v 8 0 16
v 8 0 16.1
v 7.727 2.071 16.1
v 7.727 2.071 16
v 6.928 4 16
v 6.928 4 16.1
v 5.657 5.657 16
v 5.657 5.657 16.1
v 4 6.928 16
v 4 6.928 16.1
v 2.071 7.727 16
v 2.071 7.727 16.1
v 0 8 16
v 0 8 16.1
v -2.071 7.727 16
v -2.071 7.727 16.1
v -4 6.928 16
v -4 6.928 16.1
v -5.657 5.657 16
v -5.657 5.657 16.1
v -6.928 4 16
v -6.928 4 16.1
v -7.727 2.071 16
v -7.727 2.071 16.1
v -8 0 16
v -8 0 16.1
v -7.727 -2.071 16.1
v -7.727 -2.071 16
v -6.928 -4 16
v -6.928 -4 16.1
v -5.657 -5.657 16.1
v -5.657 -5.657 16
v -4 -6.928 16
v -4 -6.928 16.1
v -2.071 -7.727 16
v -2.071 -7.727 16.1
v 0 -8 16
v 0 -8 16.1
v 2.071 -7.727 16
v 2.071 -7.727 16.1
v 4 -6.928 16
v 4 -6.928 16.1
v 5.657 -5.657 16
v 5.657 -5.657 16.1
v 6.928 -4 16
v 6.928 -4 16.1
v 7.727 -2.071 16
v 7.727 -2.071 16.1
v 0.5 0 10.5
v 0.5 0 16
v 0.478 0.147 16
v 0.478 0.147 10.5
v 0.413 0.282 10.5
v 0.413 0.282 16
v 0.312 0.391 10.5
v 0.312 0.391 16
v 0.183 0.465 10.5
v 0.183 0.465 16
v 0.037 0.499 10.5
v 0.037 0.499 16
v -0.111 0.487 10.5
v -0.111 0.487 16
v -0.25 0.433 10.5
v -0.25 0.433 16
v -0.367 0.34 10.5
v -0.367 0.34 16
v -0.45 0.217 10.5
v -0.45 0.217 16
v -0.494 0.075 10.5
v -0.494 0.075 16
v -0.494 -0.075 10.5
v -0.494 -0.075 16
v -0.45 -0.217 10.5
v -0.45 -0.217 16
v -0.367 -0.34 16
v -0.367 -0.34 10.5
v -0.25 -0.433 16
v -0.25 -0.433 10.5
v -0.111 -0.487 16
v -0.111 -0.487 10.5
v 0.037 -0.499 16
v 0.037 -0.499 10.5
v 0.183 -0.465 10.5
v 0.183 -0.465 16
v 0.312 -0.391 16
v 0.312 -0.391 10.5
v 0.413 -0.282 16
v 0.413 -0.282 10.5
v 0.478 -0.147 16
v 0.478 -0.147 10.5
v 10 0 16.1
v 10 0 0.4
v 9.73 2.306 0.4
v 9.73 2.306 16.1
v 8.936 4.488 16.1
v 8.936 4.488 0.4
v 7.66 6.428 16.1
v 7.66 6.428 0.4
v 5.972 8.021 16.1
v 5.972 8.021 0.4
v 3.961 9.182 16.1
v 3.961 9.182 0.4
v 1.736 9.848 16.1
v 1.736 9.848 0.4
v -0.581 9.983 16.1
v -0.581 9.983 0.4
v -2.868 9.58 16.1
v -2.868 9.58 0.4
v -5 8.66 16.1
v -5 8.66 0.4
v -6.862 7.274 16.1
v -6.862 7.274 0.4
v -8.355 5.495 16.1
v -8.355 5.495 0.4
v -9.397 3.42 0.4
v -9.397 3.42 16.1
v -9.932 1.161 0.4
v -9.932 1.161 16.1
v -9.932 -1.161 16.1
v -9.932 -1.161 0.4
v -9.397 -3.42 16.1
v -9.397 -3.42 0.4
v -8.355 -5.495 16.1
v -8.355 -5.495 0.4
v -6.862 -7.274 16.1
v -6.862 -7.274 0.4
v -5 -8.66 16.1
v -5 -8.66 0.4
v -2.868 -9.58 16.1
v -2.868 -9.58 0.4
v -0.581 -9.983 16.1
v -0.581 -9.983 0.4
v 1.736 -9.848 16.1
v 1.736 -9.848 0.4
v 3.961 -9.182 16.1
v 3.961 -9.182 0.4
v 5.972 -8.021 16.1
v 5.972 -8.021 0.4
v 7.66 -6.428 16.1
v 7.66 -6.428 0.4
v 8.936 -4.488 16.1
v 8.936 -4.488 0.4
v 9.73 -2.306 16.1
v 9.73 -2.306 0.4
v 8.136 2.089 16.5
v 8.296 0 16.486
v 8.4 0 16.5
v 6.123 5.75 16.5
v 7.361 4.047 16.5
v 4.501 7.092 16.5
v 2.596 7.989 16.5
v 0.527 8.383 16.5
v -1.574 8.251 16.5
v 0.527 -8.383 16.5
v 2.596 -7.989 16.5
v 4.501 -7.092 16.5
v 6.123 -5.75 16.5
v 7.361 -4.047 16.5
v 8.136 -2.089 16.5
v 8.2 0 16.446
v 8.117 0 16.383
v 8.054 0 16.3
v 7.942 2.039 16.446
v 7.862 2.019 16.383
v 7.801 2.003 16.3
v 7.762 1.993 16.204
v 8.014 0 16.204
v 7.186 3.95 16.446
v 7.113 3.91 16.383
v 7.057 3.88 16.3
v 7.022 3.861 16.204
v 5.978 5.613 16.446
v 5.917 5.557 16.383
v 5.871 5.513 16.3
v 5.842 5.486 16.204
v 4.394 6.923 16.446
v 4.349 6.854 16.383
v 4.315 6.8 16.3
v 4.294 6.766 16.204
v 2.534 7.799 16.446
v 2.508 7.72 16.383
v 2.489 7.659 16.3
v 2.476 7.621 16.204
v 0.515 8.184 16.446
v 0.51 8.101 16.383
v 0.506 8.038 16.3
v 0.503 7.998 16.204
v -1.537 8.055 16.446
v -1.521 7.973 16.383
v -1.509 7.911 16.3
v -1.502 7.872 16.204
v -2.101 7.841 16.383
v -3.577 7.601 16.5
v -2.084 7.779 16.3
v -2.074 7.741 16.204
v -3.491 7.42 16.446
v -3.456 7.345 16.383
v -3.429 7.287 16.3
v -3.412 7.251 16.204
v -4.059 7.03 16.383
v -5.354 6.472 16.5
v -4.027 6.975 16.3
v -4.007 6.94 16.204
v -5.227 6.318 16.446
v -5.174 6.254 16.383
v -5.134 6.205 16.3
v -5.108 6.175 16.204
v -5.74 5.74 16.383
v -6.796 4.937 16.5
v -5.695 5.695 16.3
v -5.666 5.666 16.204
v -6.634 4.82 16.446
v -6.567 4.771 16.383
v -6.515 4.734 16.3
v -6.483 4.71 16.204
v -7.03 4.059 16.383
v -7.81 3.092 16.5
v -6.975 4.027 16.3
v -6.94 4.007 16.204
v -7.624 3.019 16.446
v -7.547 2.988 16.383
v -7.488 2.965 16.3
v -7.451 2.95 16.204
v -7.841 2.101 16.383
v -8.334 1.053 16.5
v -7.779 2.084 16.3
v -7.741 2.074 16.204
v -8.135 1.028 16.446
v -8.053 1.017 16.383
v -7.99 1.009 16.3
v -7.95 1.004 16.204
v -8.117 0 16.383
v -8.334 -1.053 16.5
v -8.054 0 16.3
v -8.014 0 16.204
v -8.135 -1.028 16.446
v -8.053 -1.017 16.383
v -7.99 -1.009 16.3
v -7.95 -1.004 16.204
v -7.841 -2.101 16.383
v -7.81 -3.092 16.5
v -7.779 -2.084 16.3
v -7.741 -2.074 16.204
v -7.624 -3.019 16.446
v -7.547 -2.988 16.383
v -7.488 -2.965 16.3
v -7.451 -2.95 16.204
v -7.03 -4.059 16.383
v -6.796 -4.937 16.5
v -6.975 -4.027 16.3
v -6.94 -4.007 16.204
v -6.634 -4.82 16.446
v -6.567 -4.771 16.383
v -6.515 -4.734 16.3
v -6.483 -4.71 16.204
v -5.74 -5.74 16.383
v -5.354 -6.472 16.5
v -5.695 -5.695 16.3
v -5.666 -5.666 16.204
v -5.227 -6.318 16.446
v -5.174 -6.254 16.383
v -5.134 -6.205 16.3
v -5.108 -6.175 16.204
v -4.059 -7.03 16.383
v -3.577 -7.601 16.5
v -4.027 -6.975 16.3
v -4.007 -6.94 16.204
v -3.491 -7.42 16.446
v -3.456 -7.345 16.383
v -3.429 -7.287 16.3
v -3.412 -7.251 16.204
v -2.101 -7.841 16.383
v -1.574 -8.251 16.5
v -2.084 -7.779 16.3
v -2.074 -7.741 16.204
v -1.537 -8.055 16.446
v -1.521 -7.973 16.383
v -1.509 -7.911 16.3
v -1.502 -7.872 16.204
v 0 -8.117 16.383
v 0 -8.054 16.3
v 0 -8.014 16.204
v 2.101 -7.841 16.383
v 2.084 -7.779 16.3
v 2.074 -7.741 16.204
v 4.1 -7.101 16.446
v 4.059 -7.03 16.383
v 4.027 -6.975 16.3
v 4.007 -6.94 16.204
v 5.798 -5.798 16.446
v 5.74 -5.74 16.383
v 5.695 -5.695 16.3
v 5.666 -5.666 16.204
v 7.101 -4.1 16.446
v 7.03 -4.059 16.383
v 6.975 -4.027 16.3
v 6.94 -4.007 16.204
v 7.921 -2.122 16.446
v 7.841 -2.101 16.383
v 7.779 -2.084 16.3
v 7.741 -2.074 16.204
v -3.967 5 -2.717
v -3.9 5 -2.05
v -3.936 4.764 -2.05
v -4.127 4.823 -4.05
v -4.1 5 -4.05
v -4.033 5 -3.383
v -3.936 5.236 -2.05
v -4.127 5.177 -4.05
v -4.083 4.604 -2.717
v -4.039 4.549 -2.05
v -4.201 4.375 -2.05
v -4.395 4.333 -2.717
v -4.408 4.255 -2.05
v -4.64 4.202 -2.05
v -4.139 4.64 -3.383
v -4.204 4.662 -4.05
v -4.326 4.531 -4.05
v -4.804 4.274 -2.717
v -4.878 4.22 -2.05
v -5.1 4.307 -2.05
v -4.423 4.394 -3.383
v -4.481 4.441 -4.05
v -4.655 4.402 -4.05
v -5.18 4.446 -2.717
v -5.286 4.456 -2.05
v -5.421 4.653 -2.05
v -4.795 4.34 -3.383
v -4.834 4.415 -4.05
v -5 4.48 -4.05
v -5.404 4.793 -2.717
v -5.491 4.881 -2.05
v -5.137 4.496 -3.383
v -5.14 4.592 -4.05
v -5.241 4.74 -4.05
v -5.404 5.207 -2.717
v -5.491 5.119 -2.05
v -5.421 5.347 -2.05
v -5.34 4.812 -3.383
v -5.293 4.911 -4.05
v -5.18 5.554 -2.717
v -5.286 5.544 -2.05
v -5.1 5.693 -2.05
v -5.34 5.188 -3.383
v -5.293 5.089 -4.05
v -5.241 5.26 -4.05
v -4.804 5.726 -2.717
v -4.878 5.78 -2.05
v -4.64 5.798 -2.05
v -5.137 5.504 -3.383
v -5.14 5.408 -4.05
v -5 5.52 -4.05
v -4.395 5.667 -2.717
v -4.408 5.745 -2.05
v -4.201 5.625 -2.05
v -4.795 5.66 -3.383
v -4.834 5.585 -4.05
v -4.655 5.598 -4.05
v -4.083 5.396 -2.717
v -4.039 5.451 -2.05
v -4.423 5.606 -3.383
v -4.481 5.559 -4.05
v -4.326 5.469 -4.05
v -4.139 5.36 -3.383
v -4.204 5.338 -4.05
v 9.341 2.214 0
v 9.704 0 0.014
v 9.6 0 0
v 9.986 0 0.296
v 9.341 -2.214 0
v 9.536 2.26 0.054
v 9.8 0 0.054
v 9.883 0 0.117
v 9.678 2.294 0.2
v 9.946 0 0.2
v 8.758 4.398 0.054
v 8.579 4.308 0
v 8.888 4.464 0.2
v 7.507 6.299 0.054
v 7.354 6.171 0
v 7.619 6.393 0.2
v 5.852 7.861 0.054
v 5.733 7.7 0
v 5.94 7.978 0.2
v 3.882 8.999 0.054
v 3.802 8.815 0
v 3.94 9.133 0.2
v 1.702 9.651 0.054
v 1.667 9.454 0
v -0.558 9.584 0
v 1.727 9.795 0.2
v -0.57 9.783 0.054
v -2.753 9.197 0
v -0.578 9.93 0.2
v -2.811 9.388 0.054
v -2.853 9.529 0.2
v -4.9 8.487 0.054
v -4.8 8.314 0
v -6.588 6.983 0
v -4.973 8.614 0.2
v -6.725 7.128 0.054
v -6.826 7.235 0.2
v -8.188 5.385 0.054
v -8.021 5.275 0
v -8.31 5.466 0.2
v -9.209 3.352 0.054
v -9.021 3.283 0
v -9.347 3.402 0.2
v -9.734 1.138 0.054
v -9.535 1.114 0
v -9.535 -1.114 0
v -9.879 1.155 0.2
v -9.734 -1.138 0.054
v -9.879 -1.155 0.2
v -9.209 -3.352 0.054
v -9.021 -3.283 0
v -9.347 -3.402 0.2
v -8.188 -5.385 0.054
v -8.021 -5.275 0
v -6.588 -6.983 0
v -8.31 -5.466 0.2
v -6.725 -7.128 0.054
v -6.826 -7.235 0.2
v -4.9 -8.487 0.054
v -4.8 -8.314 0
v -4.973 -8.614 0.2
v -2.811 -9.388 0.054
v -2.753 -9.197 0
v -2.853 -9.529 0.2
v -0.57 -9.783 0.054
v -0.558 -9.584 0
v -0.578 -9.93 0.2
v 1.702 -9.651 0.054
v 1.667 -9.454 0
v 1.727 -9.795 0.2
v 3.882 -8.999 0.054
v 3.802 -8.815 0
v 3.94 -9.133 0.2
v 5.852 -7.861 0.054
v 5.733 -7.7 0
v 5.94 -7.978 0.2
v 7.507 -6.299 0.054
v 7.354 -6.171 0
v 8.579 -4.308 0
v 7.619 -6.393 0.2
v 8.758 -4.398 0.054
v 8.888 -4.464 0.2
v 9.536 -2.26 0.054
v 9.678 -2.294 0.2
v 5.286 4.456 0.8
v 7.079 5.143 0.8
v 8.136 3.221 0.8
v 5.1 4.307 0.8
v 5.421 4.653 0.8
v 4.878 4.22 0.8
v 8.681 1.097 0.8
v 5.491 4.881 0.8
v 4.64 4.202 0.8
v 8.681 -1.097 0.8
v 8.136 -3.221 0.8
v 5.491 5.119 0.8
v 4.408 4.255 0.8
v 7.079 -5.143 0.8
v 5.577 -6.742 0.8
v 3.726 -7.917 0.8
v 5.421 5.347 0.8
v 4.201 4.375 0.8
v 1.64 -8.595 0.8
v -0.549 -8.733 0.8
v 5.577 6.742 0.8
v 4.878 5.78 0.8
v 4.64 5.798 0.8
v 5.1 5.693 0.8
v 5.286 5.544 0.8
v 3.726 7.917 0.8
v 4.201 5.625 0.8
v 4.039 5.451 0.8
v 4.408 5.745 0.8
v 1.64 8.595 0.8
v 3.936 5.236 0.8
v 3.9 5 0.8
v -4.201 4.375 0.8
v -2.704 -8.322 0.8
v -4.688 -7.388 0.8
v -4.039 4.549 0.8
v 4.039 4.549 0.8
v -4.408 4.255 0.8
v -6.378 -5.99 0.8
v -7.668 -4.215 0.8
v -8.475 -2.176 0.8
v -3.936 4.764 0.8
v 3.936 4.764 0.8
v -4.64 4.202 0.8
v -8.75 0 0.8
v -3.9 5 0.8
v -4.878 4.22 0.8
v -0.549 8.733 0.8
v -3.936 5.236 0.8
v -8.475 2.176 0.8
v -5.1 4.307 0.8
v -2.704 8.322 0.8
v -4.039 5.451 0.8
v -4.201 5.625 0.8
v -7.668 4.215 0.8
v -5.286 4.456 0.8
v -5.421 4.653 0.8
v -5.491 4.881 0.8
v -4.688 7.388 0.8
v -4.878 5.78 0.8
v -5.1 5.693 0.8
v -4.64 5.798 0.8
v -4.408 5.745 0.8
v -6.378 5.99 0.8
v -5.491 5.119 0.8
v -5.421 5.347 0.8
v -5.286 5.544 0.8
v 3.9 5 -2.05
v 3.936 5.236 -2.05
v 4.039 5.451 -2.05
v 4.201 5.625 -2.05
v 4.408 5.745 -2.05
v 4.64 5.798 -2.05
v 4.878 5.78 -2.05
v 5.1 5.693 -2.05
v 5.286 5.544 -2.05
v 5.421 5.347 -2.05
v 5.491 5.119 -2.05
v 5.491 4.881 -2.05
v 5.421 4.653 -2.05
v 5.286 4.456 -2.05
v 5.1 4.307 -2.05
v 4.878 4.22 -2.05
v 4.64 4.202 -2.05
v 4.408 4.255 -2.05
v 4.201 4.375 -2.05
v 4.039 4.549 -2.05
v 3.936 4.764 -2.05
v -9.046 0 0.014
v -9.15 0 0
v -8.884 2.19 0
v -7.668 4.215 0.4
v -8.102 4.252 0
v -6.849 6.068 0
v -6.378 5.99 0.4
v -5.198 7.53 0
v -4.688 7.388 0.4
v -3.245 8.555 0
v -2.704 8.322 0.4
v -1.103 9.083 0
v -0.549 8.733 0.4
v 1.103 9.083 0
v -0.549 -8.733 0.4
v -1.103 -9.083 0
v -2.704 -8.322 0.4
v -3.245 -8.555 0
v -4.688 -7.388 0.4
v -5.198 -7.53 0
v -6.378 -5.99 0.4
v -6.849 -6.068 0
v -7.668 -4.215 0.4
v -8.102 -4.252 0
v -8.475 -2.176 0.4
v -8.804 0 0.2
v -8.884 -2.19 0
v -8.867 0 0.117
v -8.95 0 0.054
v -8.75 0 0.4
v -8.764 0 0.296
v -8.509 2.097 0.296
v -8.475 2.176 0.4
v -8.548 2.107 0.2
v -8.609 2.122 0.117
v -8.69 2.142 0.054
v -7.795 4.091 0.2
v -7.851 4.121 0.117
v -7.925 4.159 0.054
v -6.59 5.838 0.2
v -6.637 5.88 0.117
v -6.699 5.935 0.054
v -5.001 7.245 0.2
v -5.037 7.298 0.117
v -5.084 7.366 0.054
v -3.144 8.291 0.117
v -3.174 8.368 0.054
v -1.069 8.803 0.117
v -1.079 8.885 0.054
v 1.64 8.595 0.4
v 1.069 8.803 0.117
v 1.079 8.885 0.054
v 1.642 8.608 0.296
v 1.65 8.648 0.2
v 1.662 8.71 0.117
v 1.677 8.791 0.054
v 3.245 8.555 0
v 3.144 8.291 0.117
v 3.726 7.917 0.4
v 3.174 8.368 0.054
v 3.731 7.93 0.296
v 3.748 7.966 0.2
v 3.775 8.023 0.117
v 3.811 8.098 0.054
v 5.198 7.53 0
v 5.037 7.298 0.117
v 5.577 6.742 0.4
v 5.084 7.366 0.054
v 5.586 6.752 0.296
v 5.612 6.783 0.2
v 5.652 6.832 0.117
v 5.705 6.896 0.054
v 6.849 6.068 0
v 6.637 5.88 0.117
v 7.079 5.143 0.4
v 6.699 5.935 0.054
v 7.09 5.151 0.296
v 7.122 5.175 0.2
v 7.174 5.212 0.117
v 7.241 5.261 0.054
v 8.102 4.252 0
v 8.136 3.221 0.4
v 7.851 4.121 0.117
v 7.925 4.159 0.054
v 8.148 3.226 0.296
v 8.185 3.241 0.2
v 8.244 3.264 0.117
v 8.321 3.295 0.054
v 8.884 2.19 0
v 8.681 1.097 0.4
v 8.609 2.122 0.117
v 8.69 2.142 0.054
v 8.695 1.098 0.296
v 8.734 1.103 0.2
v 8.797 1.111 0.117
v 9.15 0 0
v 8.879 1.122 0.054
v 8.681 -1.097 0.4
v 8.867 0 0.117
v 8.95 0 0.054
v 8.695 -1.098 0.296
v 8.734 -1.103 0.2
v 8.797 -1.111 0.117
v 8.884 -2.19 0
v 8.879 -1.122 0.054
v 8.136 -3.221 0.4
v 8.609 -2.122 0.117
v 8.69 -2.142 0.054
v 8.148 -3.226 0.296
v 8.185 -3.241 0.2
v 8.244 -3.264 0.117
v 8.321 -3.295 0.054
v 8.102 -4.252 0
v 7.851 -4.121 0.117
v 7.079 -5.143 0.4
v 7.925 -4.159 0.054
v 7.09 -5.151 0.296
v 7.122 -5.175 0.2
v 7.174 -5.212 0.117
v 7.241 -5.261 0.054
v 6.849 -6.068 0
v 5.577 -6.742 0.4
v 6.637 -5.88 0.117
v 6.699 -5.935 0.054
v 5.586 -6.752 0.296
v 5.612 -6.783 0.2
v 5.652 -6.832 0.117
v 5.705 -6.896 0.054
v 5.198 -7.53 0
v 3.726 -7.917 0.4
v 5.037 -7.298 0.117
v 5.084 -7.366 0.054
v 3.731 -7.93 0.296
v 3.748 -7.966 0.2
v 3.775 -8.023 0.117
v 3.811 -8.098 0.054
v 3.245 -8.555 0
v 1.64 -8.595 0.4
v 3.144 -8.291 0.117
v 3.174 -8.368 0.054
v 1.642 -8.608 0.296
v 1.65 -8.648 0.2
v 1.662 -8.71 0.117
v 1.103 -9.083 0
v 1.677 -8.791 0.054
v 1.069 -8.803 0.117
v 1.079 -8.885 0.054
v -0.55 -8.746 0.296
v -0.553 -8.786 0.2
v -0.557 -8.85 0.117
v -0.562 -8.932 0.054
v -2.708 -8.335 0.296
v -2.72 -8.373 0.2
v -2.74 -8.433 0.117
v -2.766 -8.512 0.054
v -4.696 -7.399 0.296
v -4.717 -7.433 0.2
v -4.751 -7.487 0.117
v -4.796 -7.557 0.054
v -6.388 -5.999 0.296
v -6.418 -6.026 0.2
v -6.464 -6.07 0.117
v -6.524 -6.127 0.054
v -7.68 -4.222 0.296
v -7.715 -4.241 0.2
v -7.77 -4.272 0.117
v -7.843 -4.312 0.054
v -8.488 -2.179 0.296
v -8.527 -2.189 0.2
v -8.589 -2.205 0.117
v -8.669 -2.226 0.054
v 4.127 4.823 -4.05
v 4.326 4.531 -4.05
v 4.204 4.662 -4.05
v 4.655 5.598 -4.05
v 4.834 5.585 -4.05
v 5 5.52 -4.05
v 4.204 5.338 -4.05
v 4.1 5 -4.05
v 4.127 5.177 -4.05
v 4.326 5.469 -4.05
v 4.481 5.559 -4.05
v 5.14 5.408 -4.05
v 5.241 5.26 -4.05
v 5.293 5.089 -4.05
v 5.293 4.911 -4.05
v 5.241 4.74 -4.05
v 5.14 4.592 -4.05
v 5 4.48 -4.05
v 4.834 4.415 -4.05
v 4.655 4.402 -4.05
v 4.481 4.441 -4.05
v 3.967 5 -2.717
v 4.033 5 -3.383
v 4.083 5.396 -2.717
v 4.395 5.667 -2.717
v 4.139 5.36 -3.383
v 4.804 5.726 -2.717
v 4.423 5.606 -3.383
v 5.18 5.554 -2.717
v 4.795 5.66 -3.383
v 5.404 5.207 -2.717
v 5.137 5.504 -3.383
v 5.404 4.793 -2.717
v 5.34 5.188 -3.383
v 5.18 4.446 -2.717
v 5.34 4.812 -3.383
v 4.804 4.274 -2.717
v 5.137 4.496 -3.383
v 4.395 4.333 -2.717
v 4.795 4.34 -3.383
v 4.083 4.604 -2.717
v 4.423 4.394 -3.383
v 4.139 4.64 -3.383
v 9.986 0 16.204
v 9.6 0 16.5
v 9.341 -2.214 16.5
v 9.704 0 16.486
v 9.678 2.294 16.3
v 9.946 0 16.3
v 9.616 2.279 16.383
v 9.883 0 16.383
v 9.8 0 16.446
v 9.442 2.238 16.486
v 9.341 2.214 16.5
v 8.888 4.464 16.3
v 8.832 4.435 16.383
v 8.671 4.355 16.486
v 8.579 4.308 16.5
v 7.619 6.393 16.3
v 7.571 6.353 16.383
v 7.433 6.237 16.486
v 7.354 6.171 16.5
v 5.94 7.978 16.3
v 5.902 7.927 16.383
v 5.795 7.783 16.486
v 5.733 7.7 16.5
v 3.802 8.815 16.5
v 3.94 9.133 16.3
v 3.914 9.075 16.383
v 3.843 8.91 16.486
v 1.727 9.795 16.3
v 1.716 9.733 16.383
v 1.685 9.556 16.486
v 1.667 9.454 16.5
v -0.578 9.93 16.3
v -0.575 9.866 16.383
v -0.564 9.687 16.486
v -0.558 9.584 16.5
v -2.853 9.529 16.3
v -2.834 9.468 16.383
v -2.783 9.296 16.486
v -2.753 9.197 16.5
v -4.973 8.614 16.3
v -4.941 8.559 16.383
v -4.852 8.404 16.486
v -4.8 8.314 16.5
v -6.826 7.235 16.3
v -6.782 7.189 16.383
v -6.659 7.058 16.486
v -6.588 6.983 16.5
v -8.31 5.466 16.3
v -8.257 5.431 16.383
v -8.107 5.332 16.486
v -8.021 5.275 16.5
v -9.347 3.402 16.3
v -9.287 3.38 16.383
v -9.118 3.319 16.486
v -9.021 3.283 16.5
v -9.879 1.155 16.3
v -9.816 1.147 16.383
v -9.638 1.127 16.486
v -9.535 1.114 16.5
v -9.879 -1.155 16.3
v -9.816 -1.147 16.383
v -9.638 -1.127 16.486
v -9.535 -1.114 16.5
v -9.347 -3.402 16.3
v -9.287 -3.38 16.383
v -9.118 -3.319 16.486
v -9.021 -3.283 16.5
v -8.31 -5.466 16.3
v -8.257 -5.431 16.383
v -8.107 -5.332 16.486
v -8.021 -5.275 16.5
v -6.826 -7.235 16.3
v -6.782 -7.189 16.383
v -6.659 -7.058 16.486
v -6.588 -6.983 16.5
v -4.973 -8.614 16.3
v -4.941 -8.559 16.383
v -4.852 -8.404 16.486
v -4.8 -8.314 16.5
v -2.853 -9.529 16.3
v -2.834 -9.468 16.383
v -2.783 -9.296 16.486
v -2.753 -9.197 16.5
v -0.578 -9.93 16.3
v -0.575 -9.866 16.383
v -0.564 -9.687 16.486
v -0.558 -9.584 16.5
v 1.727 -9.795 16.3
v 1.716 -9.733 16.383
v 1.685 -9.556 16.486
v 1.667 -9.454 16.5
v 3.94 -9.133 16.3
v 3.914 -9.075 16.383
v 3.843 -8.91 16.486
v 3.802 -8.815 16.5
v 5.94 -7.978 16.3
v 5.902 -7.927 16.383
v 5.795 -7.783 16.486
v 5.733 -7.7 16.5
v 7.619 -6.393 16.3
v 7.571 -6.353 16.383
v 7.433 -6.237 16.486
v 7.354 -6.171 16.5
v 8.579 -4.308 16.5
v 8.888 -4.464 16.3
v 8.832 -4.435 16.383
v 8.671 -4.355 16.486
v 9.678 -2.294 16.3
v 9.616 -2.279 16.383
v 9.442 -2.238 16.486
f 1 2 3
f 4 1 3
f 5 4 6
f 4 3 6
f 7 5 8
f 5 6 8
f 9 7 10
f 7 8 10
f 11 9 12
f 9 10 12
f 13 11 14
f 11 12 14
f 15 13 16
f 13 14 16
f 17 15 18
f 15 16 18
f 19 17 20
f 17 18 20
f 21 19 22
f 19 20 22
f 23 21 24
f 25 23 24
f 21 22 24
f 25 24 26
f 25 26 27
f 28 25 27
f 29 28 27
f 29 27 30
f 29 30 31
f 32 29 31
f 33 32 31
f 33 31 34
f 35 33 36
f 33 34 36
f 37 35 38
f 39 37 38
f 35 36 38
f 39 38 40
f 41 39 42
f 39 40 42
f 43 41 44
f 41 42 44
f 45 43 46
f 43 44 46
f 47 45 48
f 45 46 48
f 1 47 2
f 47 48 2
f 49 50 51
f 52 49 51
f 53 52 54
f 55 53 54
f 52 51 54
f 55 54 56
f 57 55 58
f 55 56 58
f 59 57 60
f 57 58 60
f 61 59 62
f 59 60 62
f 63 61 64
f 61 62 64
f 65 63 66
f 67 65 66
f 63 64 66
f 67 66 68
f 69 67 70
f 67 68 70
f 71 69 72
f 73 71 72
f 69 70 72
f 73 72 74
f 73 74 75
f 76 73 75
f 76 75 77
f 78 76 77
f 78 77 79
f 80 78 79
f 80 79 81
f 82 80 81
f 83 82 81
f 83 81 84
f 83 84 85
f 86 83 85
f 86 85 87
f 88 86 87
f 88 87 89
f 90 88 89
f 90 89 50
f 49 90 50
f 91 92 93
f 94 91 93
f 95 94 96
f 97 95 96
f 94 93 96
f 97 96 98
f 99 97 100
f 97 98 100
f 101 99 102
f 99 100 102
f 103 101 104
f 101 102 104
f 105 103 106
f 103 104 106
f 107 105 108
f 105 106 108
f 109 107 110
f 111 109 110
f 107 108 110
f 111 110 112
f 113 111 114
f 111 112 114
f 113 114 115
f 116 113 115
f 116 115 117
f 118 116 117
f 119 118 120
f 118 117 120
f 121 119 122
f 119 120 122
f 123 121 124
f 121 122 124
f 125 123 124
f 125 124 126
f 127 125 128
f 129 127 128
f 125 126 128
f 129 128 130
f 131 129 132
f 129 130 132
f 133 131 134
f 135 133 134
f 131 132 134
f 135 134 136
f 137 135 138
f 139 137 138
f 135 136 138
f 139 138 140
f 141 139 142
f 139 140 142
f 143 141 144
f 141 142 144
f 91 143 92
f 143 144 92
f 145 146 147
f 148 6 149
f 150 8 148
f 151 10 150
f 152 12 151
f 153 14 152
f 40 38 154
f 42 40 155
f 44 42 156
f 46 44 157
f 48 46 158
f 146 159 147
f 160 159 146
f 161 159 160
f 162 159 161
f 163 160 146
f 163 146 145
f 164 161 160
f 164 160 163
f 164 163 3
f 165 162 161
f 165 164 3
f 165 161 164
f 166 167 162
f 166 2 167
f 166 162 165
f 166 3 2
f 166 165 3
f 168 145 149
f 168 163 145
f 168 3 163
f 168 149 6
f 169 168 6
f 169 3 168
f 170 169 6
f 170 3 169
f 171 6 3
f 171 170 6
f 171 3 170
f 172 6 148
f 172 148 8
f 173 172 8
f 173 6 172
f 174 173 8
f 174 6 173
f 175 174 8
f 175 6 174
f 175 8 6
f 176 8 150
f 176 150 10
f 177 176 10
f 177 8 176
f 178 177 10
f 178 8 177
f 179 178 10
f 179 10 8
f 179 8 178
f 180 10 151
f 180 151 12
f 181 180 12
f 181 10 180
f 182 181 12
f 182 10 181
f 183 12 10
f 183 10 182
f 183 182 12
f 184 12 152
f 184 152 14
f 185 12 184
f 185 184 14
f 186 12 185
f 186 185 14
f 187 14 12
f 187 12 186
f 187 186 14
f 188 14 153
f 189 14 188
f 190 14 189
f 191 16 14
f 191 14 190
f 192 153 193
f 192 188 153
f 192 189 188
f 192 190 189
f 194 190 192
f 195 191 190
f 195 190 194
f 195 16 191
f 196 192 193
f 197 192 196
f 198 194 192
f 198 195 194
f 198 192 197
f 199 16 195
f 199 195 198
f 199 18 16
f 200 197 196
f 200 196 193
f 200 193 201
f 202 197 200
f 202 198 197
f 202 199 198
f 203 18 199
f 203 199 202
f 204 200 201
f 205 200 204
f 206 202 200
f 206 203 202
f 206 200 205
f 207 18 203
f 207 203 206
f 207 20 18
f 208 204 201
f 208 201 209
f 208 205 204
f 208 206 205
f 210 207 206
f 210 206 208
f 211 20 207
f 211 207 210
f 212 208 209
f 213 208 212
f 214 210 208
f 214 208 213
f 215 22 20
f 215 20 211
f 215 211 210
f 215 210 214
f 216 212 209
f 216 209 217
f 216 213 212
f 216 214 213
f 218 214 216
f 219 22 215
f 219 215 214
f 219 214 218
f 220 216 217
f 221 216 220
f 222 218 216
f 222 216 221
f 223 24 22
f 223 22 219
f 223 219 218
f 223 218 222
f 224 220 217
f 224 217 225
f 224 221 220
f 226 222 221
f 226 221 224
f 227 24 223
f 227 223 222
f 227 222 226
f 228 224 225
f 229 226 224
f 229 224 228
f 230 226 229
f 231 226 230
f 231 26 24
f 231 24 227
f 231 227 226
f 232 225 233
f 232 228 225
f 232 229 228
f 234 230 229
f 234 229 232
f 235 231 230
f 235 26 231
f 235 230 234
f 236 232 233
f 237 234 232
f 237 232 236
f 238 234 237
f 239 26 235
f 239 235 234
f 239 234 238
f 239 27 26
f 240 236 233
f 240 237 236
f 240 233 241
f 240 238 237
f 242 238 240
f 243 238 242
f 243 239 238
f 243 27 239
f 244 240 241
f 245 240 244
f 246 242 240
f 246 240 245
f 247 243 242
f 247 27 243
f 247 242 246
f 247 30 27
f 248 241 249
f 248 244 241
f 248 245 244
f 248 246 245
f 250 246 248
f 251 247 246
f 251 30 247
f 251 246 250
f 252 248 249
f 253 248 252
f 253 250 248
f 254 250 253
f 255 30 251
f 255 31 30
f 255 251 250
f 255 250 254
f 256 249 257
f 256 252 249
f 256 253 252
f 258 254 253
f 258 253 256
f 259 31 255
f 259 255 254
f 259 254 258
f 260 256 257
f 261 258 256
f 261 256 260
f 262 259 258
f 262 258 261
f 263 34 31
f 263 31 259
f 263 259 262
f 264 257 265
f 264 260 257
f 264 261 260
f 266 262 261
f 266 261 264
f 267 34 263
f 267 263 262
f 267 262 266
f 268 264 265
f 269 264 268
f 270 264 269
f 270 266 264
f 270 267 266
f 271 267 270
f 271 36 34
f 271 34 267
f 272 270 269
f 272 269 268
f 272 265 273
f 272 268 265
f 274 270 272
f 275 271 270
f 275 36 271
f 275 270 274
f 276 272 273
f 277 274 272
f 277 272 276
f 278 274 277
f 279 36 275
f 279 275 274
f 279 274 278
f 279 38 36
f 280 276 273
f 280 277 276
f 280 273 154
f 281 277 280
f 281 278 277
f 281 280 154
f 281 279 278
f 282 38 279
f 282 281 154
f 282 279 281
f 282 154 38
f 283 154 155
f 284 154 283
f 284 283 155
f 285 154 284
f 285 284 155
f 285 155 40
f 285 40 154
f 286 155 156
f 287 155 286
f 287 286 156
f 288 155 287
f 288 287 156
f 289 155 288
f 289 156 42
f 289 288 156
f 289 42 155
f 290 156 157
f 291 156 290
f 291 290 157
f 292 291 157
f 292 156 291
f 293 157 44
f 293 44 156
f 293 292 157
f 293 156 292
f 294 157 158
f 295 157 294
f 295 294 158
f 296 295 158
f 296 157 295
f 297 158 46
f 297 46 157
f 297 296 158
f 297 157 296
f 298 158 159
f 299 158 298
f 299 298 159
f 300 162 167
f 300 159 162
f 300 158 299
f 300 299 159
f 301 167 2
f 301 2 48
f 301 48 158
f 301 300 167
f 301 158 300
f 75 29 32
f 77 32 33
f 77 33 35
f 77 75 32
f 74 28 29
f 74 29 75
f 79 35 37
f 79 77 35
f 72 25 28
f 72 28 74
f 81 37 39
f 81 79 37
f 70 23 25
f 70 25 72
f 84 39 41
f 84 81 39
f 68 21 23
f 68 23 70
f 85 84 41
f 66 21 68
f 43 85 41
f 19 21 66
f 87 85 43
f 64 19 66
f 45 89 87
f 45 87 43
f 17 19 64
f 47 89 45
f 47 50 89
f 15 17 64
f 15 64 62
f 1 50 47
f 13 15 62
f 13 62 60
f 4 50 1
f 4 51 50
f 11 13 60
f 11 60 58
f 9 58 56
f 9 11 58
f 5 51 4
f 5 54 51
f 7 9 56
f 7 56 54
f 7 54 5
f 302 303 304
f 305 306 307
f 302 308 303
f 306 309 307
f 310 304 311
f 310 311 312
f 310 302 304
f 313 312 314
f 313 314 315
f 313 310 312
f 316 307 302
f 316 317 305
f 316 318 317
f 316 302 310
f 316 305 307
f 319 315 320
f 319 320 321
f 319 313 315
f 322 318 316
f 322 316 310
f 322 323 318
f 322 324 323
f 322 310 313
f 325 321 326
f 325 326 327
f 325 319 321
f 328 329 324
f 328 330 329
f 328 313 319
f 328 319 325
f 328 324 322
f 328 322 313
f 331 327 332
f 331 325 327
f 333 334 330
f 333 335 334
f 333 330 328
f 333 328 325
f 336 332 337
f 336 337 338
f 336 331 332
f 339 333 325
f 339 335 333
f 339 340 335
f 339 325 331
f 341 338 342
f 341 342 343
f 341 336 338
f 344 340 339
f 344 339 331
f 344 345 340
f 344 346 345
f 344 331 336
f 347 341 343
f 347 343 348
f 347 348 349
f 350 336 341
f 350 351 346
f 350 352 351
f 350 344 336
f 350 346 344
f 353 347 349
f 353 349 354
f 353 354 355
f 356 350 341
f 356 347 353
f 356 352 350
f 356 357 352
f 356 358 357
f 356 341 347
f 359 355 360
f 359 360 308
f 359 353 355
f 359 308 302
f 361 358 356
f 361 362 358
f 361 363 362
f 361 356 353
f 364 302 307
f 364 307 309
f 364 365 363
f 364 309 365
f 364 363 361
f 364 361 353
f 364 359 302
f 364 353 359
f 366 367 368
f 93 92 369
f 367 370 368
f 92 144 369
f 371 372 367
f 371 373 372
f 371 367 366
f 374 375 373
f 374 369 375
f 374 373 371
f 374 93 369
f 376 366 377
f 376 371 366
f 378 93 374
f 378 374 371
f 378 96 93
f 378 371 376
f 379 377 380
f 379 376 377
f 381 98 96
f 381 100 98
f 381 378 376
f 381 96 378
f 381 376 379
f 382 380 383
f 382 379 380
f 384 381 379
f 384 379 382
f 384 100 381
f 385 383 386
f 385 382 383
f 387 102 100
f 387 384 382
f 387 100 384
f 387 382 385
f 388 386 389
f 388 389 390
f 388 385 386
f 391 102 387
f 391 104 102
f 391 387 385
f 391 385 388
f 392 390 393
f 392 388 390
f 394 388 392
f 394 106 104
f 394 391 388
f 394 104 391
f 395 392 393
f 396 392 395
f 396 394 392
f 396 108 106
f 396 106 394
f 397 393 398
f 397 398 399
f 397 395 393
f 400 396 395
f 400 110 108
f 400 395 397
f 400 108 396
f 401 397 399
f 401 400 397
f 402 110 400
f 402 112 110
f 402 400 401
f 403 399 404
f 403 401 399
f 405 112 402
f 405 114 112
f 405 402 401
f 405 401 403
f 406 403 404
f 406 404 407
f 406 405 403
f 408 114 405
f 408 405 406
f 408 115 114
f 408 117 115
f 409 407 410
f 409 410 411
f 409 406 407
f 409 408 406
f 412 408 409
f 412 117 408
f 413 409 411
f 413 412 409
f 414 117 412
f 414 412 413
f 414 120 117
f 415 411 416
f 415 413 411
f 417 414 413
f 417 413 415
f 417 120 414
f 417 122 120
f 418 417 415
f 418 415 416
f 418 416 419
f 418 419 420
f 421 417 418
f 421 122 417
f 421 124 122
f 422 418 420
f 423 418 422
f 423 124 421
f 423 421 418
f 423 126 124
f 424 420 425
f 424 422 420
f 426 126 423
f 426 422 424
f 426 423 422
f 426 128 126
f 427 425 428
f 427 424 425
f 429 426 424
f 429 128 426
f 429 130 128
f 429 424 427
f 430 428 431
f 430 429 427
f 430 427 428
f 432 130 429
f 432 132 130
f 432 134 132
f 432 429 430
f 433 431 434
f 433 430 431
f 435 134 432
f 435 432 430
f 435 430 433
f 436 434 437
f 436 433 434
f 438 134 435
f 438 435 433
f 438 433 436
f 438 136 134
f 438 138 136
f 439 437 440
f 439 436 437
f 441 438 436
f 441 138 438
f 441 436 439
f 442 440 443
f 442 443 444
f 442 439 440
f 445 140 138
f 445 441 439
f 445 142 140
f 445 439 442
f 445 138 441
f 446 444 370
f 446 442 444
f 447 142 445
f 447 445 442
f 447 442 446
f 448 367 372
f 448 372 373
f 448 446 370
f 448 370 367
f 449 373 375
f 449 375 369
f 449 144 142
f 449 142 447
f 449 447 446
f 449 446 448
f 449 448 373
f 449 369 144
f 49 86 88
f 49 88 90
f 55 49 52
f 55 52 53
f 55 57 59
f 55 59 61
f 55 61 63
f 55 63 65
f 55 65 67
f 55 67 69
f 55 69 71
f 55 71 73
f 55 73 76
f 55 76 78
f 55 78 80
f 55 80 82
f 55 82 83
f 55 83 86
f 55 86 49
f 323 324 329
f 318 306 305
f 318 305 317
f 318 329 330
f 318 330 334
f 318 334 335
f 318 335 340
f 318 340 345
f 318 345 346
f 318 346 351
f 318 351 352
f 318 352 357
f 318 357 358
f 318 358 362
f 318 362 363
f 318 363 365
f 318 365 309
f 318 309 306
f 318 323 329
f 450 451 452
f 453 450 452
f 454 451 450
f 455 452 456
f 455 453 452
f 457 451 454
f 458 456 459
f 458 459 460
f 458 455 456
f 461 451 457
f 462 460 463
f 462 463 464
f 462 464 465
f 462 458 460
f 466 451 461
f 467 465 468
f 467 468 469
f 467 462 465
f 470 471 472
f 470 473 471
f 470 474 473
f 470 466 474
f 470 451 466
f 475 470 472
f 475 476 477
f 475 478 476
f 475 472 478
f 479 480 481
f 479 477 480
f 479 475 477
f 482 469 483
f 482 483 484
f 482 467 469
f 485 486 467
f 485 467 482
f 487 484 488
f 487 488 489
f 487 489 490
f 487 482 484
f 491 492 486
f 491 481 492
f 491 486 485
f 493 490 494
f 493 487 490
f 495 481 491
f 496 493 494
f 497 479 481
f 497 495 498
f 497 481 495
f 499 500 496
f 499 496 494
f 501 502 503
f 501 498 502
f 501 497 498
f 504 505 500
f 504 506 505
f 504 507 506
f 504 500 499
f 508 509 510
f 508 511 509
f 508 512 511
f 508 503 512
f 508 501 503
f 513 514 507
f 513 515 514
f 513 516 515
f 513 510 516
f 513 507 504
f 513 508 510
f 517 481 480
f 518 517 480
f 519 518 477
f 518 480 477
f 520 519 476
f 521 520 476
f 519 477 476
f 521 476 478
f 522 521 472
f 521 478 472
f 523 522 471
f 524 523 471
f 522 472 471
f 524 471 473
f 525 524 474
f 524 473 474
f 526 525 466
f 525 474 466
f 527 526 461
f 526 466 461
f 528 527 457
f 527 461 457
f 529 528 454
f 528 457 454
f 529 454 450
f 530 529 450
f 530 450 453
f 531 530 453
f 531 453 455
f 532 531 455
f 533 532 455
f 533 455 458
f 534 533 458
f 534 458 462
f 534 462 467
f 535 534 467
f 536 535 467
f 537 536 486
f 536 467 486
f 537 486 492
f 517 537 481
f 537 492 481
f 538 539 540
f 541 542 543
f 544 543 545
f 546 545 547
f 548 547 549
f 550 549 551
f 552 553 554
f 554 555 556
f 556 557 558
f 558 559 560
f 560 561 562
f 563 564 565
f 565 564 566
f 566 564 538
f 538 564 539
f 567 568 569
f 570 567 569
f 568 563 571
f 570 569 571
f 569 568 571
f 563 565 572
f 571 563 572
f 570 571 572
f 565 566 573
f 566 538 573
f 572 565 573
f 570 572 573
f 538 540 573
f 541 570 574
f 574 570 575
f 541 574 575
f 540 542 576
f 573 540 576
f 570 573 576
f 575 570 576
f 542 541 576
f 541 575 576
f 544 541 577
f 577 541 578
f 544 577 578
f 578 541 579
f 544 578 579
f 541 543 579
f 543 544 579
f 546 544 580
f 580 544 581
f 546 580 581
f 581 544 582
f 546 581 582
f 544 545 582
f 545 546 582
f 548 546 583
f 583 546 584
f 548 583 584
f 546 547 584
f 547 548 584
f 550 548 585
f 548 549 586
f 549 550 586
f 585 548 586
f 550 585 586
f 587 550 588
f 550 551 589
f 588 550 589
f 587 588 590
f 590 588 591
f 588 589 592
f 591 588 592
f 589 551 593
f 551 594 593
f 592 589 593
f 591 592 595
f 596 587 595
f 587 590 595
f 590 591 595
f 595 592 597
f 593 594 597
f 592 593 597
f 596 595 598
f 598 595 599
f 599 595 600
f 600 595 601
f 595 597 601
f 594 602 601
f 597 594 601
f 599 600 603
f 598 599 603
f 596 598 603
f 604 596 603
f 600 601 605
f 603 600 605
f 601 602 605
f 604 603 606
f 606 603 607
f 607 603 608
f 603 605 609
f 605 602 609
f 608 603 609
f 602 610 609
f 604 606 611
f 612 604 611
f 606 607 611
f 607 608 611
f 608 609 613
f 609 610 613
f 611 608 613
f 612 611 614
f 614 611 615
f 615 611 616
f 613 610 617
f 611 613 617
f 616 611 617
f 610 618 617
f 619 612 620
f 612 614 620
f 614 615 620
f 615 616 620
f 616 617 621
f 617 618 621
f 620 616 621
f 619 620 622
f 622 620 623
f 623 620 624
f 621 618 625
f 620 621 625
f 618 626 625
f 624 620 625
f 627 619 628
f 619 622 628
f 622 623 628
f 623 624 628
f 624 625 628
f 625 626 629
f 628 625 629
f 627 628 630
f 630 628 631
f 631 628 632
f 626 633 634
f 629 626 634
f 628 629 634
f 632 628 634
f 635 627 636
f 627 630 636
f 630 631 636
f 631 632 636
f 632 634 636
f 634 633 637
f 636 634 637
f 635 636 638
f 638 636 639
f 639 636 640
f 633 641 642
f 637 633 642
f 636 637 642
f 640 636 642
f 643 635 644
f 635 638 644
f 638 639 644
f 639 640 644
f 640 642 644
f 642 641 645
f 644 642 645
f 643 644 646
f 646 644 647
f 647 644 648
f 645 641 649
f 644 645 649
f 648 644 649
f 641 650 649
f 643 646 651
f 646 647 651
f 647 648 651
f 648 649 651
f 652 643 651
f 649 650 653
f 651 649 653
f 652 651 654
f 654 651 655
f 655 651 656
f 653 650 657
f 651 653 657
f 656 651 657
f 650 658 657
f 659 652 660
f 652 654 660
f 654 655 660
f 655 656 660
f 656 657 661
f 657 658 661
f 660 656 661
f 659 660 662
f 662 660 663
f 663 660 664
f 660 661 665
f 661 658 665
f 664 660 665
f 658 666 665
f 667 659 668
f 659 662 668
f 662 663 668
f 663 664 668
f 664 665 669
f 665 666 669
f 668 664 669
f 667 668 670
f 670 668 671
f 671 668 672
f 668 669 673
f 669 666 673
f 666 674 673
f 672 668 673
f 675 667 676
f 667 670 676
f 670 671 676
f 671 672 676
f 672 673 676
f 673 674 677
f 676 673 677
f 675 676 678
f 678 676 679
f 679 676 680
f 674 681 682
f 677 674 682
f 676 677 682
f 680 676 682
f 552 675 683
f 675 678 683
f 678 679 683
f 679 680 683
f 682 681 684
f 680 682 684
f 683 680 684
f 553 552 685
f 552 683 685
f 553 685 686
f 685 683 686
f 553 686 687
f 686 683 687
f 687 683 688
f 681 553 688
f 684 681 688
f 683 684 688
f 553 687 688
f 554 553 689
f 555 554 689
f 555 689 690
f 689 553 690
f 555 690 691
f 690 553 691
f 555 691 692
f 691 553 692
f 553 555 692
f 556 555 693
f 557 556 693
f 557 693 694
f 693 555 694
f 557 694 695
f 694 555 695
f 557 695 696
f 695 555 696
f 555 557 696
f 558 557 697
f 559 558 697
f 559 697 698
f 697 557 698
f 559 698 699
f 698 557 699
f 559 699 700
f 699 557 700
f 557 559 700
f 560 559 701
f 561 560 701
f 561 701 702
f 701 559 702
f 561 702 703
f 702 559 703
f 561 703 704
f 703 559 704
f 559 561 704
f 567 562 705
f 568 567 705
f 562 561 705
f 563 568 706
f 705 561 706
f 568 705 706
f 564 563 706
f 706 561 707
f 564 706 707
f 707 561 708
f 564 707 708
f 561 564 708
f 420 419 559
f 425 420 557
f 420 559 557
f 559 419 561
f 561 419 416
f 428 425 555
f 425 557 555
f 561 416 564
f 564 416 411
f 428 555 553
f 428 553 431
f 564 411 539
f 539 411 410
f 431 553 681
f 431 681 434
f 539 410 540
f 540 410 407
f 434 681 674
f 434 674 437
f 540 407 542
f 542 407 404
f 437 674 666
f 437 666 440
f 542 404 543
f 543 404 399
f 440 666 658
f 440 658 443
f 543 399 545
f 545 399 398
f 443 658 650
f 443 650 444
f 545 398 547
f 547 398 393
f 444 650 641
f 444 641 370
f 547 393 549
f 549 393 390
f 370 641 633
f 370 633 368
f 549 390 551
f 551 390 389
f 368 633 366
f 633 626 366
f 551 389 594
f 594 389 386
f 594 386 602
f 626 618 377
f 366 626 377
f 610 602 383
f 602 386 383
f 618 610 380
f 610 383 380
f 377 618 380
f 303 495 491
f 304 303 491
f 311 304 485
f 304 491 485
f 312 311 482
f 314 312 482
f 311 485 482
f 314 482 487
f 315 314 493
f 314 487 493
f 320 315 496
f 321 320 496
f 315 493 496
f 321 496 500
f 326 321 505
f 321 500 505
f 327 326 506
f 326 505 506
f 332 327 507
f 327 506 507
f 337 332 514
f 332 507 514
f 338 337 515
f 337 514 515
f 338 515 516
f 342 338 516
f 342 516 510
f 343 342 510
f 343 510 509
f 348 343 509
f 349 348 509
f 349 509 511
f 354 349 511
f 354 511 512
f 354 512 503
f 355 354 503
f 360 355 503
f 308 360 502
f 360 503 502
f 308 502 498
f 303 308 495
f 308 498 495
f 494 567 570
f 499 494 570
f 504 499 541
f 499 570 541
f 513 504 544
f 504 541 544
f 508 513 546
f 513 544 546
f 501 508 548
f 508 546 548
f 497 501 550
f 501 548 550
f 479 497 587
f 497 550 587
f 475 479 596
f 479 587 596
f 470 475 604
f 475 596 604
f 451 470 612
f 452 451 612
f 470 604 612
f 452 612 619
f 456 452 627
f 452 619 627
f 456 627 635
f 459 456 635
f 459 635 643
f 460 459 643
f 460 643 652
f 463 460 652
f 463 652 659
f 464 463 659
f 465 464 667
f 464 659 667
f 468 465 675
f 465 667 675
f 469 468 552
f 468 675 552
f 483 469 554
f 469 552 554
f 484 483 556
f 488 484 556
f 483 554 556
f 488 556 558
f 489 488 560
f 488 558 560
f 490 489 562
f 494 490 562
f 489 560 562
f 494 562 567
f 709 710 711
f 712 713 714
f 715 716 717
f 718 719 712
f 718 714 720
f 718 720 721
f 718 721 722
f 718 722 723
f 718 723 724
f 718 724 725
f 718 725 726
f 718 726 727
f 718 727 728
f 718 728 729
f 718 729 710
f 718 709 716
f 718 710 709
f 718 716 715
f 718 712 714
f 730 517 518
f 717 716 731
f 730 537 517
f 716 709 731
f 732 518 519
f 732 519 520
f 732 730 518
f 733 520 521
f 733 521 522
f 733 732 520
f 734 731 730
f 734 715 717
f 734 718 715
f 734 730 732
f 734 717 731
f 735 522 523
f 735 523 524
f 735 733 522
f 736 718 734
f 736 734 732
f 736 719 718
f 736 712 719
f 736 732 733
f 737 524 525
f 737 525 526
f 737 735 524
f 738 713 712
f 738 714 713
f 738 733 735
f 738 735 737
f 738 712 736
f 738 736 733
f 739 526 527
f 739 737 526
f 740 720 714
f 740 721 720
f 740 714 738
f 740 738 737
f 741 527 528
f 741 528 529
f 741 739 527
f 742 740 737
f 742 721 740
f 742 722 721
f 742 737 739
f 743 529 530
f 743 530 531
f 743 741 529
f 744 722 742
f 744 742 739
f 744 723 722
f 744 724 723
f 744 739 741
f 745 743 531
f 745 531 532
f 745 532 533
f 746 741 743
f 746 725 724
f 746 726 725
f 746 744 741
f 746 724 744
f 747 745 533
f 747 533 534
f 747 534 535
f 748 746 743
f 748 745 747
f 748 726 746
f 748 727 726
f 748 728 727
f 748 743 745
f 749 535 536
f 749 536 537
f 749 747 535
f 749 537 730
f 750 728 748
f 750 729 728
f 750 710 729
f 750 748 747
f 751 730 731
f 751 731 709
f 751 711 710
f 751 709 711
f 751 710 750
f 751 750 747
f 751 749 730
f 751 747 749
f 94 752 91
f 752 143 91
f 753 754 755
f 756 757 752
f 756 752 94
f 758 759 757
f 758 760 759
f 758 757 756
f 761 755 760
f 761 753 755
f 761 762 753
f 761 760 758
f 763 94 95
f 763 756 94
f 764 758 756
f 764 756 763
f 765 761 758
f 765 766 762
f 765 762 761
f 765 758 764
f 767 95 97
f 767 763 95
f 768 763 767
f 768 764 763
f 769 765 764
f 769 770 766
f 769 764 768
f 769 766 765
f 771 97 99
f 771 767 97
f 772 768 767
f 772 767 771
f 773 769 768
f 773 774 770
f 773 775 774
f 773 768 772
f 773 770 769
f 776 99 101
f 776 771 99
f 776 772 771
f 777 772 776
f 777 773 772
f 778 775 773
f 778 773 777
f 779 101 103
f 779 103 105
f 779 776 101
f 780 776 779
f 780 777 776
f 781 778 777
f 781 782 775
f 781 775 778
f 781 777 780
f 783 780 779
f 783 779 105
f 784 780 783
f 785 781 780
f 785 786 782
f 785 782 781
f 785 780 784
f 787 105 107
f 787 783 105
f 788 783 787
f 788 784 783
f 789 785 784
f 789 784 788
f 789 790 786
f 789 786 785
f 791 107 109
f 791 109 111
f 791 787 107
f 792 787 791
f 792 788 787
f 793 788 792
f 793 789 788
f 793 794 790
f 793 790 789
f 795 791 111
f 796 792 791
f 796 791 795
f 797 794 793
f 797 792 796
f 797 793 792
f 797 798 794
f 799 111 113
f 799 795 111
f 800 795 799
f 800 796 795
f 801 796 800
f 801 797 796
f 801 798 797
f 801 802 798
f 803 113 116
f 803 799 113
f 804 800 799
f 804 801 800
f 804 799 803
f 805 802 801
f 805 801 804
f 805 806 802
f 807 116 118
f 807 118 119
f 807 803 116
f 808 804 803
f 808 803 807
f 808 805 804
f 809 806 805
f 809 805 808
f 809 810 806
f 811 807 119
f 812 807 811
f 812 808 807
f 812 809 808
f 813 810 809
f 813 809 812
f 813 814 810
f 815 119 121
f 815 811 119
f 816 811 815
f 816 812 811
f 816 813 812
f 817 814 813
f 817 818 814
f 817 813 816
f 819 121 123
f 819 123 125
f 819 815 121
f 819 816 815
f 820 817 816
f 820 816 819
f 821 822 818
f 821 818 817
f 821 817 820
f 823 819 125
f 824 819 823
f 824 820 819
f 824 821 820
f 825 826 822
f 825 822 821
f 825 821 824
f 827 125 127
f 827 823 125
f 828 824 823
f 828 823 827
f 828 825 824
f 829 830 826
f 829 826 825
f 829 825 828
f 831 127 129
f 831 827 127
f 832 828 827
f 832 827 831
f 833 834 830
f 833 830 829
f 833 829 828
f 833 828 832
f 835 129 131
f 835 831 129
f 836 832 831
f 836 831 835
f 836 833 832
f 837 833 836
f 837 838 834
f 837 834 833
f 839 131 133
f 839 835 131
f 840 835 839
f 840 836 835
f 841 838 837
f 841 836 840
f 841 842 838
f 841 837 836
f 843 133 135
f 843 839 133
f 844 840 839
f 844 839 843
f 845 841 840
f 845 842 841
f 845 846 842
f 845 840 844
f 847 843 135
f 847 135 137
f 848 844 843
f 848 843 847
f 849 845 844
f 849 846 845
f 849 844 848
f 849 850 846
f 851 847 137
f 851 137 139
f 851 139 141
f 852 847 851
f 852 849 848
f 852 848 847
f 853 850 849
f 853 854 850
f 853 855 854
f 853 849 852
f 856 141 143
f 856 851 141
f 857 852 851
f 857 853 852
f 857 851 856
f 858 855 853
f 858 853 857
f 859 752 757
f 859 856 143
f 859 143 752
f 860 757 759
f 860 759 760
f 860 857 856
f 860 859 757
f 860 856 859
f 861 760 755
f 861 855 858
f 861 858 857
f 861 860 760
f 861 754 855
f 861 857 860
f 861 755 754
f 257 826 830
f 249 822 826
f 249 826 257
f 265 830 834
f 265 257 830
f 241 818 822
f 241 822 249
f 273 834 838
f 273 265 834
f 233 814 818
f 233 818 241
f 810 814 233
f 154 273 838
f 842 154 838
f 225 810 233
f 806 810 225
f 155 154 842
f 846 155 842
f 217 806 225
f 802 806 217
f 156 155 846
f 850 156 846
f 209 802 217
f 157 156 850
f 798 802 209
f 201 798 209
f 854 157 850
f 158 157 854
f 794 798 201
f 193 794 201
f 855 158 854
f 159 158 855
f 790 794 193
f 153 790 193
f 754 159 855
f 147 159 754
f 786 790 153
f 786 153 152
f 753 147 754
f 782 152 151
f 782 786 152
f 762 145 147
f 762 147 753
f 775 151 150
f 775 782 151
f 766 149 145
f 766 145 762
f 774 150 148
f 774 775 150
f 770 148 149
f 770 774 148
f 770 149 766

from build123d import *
from OCP.BRepFilletAPI import BRepFilletAPI_MakeChamfer

# Parameters (mm, degrees)
SKETCH_1_R          = 10
EXTRUDE_1_DEPTH     = 16.5
SKETCH_2_R          = 0.5
CUT_EXTRUDE_1_DEPTH = 6
SKETCH_3_R          = 8
CUT_EXTRUDE_2_DEPTH = 0.5
SKETCH_4_R          = 8.75
CUT_EXTRUDE_3_DEPTH = 0.8
SKETCH_5_R          = 0.8
EXTRUDE_2_DEPTH     = 4.85
CHAMFER_1_SIZE      = 2
CHAMFER_1_SIZE2     = 0.2
FILLET_1_R          = 0.4


with BuildPart() as part:
    # Эскиз1 → Бобышка-Вытянуть1 (new body)
    with BuildSketch(Plane.XY):
        Circle(SKETCH_1_R)
    extrude(amount=EXTRUDE_1_DEPTH)

    # Эскиз2 → Вырез-Вытянуть1 (cut)
    with BuildSketch(Plane.XY.offset(16.5)):
        Circle(SKETCH_2_R)
    extrude(amount=-CUT_EXTRUDE_1_DEPTH, mode=Mode.SUBTRACT)

    # Эскиз3 → Вырез-Вытянуть2 (cut)
    with BuildSketch(Plane.XY.offset(16.5)):
        Circle(SKETCH_3_R)
    extrude(amount=-CUT_EXTRUDE_2_DEPTH, mode=Mode.SUBTRACT)

    # Эскиз4 → Вырез-Вытянуть3 (cut)
    with BuildSketch(Plane(origin=(0, 0, 0), x_dir=(-1, 0, 0), z_dir=(0, 0, -1))):
        Circle(SKETCH_4_R)
    extrude(amount=-CUT_EXTRUDE_3_DEPTH, mode=Mode.SUBTRACT)

    # Эскиз5 → Бобышка-Вытянуть2 (add)
    with BuildSketch(Plane(origin=(0, 0, 0.8), x_dir=(-1, 0, 0), z_dir=(0, 0, -1))):
        with Locations((-4.7, 5)):
            Circle(SKETCH_5_R)
        with Locations(Location((4.7, 5, 0), (0, 0, 180))):
            Circle(SKETCH_5_R)
    extrude(amount=EXTRUDE_2_DEPTH)

    # Фаска1: one chamfer whose edges measure the first distance from different faces: ONE call of the kernel's chamfer builder (chamfer() names one face for all edges)
    chamfer_1_edges_1 = [part.edges().sort_by_distance(p)[0] for p in [
        (5.5, 5, -4.05),
    ]]
    chamfer_1_side_1 = [part.faces().sort_by_distance(p)[0] for p in [
        (5.5, 5, -1.625),
    ]]
    chamfer_1_edges_2 = [part.edges().sort_by_distance(p)[0] for p in [
        (-5.5, 5, -4.05),
    ]]
    chamfer_1_side_2 = [part.faces().sort_by_distance(p)[0] for p in [
        (-5.5, 5, -1.625),
    ]]
    chamfer_1 = BRepFilletAPI_MakeChamfer(part.part.solid().wrapped)
    for e in chamfer_1_edges_1:
        chamfer_1.Add(CHAMFER_1_SIZE, CHAMFER_1_SIZE2, e.wrapped, chamfer_1_side_1[0].wrapped)  # the first distance lies on this face
    for e in chamfer_1_edges_2:
        chamfer_1.Add(CHAMFER_1_SIZE, CHAMFER_1_SIZE2, e.wrapped, chamfer_1_side_2[0].wrapped)  # the first distance lies on this face
    add(Compound.cast(chamfer_1.Shape()), mode=Mode.REPLACE)

    # Скругление1
    fillet_1_edges = [part.edges().sort_by_distance(p)[0] for p in [
        (-8, 0, 16.5),
        (-10, 0, 0),
        (8.75, 0, 0),
        (-10, 0, 16.5),
    ]]
    fillet(fillet_1_edges, radius=FILLET_1_R)


solid = part.part
